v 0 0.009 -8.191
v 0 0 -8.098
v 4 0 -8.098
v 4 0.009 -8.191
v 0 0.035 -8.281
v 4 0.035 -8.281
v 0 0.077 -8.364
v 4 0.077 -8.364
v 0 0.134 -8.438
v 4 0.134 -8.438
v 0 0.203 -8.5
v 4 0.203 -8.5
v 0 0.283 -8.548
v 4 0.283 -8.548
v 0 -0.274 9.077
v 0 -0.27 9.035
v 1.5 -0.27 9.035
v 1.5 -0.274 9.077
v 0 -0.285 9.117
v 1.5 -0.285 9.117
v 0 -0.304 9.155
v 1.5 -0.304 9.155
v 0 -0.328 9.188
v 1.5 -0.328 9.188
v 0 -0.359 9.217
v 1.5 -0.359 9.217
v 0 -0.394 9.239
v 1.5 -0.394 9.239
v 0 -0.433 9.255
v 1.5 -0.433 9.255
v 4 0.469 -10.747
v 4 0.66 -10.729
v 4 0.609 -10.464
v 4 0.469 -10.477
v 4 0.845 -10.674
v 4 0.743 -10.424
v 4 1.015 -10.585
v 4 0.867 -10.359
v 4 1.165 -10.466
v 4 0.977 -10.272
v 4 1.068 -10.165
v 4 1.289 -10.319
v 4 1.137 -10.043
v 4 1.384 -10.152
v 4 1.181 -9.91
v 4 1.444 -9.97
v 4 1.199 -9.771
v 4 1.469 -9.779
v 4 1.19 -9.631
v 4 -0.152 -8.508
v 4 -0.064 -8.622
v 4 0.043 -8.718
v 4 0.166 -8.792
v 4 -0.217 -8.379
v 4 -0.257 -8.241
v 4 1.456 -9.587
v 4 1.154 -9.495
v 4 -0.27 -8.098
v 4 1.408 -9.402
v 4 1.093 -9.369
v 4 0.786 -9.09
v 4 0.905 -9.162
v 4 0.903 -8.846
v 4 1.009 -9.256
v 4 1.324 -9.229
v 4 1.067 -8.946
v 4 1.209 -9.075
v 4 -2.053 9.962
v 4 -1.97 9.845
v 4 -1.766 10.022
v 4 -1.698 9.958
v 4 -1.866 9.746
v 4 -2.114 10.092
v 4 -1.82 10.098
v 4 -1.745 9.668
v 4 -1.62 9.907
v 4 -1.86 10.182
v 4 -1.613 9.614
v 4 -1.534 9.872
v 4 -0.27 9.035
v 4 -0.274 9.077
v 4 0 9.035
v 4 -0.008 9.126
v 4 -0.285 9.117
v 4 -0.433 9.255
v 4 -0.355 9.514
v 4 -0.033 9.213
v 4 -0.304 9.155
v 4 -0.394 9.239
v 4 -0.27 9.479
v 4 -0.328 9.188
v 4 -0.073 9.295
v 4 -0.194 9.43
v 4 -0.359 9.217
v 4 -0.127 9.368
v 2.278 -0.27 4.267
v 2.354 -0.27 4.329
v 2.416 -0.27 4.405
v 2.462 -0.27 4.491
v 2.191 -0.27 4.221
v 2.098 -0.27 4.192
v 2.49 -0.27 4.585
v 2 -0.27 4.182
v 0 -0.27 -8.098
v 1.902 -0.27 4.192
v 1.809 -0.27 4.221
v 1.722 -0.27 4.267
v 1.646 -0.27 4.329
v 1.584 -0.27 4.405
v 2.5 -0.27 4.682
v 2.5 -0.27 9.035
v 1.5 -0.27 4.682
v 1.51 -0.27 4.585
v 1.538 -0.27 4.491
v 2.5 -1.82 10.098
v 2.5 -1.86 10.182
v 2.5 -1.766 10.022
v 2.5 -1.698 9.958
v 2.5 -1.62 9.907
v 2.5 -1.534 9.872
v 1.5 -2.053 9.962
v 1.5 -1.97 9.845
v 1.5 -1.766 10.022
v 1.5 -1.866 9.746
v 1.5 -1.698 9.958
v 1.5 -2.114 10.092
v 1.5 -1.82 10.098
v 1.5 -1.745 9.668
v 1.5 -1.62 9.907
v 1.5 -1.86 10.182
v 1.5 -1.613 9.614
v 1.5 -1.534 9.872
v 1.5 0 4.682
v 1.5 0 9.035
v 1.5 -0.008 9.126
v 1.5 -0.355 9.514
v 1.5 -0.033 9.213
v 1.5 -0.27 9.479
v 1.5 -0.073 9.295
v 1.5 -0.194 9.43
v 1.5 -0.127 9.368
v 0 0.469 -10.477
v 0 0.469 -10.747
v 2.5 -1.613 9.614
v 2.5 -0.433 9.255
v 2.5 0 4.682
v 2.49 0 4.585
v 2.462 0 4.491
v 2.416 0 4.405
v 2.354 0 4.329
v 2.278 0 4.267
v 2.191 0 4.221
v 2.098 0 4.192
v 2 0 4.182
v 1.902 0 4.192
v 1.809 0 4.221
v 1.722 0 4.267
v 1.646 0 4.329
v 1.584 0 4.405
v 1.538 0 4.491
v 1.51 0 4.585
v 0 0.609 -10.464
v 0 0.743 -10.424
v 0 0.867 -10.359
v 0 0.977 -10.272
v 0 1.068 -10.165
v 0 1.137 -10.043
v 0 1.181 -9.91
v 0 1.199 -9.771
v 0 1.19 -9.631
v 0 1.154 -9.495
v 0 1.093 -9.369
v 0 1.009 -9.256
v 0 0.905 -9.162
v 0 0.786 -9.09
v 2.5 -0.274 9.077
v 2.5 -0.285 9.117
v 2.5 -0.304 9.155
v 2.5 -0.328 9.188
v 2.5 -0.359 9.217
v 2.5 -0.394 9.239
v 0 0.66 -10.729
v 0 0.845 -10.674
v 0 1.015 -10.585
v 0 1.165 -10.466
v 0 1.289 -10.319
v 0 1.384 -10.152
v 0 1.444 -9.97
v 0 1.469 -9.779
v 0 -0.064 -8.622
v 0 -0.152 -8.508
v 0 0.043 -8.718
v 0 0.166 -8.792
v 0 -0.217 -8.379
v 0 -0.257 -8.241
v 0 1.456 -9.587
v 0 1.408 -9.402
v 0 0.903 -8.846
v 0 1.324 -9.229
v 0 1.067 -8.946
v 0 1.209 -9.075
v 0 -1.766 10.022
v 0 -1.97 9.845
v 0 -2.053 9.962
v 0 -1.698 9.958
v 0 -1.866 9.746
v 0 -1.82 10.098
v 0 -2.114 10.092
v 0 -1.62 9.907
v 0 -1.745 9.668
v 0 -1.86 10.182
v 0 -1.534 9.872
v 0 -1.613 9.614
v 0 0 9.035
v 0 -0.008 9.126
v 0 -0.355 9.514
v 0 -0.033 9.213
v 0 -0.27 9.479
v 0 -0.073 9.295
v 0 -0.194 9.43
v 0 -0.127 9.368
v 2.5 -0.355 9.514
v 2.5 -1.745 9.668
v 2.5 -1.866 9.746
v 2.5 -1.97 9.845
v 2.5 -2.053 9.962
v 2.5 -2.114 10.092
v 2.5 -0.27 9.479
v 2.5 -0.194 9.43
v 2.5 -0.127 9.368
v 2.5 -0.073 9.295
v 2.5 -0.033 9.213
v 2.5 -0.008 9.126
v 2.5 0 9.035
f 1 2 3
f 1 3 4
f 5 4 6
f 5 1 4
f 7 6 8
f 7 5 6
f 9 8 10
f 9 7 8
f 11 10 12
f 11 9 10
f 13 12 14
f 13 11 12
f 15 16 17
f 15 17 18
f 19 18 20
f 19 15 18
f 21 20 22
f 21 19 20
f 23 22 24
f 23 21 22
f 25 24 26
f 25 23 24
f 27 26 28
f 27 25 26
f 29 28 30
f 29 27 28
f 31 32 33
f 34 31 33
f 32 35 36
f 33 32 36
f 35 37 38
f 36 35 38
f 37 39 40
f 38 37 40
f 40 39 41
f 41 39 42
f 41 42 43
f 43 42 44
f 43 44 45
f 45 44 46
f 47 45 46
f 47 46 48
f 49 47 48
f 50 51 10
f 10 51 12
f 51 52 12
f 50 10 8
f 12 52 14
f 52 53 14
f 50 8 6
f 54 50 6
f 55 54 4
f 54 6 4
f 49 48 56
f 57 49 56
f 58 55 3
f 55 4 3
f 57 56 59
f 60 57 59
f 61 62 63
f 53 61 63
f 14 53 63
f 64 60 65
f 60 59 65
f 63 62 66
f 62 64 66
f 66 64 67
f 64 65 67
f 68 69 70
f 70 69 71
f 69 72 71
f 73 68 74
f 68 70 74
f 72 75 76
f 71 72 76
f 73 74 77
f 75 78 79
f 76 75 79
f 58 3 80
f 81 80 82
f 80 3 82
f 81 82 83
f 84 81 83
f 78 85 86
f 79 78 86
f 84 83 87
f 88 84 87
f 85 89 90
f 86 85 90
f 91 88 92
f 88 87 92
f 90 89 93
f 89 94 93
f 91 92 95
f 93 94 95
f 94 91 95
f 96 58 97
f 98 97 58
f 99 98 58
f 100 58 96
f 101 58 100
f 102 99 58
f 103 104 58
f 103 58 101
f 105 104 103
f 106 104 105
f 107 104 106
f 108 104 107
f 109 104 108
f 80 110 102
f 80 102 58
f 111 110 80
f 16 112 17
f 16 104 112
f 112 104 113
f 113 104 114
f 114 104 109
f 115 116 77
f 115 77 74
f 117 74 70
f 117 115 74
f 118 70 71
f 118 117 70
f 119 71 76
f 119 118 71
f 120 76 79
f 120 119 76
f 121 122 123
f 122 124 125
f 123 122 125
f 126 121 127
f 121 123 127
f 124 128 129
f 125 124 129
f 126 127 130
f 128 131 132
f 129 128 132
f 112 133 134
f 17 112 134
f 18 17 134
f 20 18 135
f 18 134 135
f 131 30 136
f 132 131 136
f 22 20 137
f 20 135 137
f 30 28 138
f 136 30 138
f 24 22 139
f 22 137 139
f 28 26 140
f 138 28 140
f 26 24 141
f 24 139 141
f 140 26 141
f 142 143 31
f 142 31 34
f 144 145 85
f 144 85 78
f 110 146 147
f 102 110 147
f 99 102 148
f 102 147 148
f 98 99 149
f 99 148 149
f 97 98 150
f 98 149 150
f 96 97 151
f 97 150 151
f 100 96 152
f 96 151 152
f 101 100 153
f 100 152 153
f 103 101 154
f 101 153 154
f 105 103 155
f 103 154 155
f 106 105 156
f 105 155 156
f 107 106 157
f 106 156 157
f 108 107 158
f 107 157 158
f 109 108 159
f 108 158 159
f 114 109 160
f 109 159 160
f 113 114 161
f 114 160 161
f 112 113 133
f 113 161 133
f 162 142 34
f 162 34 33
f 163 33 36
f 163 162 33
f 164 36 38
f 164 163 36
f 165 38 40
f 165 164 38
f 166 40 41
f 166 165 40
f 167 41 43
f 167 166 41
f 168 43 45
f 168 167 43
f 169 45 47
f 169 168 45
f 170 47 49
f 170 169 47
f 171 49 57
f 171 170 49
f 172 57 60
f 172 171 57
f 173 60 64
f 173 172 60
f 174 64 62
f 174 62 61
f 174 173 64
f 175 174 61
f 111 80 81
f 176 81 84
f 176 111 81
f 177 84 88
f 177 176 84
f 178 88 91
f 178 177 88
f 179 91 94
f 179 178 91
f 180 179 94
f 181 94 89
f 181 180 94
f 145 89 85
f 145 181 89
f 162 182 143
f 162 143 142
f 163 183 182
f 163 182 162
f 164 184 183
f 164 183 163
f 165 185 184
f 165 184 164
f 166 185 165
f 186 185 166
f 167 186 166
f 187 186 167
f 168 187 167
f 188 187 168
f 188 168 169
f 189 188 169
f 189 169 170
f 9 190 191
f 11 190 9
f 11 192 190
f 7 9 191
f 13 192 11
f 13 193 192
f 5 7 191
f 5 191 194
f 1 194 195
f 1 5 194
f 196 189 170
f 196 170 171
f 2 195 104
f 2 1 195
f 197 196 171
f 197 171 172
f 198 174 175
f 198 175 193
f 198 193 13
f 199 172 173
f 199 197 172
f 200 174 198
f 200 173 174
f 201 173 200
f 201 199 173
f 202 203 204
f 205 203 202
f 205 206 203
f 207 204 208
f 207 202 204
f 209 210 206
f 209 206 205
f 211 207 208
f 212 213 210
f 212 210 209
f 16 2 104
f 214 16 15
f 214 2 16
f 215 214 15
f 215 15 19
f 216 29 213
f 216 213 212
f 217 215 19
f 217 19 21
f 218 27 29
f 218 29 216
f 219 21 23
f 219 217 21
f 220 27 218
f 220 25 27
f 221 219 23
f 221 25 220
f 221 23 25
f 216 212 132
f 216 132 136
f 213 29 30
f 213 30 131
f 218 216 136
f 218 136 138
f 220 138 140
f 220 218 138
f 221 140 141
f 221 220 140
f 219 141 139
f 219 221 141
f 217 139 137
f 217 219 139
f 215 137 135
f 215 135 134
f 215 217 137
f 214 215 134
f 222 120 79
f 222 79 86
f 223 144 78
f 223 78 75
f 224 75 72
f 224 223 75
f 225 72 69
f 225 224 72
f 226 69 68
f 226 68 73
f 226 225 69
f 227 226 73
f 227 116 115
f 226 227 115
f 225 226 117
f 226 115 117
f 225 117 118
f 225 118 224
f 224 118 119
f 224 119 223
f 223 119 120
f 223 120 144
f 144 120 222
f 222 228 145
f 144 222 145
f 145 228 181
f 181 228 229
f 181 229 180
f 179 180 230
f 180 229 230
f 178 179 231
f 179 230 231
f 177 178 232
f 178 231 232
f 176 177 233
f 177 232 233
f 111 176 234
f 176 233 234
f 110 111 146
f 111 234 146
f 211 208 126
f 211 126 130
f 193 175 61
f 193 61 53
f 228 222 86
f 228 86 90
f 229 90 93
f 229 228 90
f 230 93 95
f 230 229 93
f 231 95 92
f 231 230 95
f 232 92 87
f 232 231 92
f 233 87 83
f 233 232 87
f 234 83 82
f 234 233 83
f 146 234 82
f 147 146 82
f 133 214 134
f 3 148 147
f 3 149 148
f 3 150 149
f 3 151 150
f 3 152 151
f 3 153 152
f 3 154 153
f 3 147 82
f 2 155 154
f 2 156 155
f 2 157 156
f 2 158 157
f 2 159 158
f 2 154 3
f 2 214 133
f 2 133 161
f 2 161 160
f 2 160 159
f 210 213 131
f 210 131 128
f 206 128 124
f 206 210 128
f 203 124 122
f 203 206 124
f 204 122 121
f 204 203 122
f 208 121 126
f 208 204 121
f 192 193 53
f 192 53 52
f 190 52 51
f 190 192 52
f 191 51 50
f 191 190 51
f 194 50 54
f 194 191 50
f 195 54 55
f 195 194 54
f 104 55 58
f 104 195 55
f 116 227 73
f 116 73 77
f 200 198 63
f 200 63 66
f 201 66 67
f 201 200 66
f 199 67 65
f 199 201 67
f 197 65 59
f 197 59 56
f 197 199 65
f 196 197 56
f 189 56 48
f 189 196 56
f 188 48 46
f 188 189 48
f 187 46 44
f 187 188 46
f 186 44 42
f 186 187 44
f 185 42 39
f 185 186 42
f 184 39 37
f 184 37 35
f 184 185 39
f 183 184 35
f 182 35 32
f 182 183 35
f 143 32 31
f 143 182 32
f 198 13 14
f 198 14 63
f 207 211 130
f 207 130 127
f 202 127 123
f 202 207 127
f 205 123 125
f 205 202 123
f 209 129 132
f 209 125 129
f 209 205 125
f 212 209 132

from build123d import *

# Parameters (mm, degrees)
BOSS_EXTRUDE1_DEPTH = 4
CUT_EXTRUDE1_DEPTH  = 4.15


with BuildPart() as part:
    # Sketch1 → Boss-Extrude1 (new body)
    with BuildSketch(Plane(origin=(0, 0, 0), x_dir=(0, 0, -1), z_dir=(1, 0, 0))):
        with BuildLine():
            Line((-9.035192226, 0), (8.097860886, 0))
            ThreePointArc((8.097860886, 0), (8.363999261, 0.076714795), (8.548470634, 0.283318539))
            Line((8.548470634, 0.283318539), (8.84623237, 0.902542447))
            ThreePointArc((8.84623237, 0.902542447), (9.969691043, 1.444171704), (10.747451865, 0.469179525))
            Line((10.747451865, 0.469179525), (10.477451865, 0.469179525))
            ThreePointArc((10.477451865, 0.469179525), (9.909686465, 1.180923816), (9.089561634, 0.785534458))
            Line((9.089561634, 0.785534458), (8.791799897, 0.166310551))
            ThreePointArc((8.791799897, 0.166310551), (8.507713984, -0.151859216), (8.097860886, -0.27))
            Line((8.097860886, -0.27), (-9.035192226, -0.27))
            ThreePointArc((-9.035192226, -0.27), (-9.172148547, -0.315221846), (-9.255249062, -0.433104643))
            Line((-9.255249062, -0.433104643), (-9.613802226, -1.612589711))
            ThreePointArc((-9.613802226, -1.612589711), (-9.79321671, -1.919973115), (-10.091698781, -2.113835356))
            Line((-10.091698781, -2.113835356), (-10.182452255, -1.859544564))
            ThreePointArc((-10.182452255, -1.859544564), (-9.988632728, -1.733659992), (-9.872129816, -1.534060379))
            Line((-9.872129816, -1.534060379), (-9.513576653, -0.354575311))
            ThreePointArc((-9.513576653, -0.354575311), (-9.332923359, -0.098308362), (-9.035192226, 0))
        make_face()
    extrude(amount=BOSS_EXTRUDE1_DEPTH)

    # Sketch2 → Cut-Extrude1 (cut)
    with BuildSketch(Plane(origin=(0, 0, 0), x_dir=(1, 0, 0), z_dir=(0, 1, 0))):
        with BuildLine():
            Line((1.5, -4.682452255), (1.5, -10.182452255))
            Line((1.5, -10.182452255), (2.5, -10.182452255))
            Line((2.5, -10.182452255), (2.5, -4.682452255))
            ThreePointArc((2.5, -4.682452255), (2, -4.182452255), (1.5, -4.682452255))
        make_face()
    extrude(amount=-CUT_EXTRUDE1_DEPTH, mode=Mode.SUBTRACT)


solid = part.part
